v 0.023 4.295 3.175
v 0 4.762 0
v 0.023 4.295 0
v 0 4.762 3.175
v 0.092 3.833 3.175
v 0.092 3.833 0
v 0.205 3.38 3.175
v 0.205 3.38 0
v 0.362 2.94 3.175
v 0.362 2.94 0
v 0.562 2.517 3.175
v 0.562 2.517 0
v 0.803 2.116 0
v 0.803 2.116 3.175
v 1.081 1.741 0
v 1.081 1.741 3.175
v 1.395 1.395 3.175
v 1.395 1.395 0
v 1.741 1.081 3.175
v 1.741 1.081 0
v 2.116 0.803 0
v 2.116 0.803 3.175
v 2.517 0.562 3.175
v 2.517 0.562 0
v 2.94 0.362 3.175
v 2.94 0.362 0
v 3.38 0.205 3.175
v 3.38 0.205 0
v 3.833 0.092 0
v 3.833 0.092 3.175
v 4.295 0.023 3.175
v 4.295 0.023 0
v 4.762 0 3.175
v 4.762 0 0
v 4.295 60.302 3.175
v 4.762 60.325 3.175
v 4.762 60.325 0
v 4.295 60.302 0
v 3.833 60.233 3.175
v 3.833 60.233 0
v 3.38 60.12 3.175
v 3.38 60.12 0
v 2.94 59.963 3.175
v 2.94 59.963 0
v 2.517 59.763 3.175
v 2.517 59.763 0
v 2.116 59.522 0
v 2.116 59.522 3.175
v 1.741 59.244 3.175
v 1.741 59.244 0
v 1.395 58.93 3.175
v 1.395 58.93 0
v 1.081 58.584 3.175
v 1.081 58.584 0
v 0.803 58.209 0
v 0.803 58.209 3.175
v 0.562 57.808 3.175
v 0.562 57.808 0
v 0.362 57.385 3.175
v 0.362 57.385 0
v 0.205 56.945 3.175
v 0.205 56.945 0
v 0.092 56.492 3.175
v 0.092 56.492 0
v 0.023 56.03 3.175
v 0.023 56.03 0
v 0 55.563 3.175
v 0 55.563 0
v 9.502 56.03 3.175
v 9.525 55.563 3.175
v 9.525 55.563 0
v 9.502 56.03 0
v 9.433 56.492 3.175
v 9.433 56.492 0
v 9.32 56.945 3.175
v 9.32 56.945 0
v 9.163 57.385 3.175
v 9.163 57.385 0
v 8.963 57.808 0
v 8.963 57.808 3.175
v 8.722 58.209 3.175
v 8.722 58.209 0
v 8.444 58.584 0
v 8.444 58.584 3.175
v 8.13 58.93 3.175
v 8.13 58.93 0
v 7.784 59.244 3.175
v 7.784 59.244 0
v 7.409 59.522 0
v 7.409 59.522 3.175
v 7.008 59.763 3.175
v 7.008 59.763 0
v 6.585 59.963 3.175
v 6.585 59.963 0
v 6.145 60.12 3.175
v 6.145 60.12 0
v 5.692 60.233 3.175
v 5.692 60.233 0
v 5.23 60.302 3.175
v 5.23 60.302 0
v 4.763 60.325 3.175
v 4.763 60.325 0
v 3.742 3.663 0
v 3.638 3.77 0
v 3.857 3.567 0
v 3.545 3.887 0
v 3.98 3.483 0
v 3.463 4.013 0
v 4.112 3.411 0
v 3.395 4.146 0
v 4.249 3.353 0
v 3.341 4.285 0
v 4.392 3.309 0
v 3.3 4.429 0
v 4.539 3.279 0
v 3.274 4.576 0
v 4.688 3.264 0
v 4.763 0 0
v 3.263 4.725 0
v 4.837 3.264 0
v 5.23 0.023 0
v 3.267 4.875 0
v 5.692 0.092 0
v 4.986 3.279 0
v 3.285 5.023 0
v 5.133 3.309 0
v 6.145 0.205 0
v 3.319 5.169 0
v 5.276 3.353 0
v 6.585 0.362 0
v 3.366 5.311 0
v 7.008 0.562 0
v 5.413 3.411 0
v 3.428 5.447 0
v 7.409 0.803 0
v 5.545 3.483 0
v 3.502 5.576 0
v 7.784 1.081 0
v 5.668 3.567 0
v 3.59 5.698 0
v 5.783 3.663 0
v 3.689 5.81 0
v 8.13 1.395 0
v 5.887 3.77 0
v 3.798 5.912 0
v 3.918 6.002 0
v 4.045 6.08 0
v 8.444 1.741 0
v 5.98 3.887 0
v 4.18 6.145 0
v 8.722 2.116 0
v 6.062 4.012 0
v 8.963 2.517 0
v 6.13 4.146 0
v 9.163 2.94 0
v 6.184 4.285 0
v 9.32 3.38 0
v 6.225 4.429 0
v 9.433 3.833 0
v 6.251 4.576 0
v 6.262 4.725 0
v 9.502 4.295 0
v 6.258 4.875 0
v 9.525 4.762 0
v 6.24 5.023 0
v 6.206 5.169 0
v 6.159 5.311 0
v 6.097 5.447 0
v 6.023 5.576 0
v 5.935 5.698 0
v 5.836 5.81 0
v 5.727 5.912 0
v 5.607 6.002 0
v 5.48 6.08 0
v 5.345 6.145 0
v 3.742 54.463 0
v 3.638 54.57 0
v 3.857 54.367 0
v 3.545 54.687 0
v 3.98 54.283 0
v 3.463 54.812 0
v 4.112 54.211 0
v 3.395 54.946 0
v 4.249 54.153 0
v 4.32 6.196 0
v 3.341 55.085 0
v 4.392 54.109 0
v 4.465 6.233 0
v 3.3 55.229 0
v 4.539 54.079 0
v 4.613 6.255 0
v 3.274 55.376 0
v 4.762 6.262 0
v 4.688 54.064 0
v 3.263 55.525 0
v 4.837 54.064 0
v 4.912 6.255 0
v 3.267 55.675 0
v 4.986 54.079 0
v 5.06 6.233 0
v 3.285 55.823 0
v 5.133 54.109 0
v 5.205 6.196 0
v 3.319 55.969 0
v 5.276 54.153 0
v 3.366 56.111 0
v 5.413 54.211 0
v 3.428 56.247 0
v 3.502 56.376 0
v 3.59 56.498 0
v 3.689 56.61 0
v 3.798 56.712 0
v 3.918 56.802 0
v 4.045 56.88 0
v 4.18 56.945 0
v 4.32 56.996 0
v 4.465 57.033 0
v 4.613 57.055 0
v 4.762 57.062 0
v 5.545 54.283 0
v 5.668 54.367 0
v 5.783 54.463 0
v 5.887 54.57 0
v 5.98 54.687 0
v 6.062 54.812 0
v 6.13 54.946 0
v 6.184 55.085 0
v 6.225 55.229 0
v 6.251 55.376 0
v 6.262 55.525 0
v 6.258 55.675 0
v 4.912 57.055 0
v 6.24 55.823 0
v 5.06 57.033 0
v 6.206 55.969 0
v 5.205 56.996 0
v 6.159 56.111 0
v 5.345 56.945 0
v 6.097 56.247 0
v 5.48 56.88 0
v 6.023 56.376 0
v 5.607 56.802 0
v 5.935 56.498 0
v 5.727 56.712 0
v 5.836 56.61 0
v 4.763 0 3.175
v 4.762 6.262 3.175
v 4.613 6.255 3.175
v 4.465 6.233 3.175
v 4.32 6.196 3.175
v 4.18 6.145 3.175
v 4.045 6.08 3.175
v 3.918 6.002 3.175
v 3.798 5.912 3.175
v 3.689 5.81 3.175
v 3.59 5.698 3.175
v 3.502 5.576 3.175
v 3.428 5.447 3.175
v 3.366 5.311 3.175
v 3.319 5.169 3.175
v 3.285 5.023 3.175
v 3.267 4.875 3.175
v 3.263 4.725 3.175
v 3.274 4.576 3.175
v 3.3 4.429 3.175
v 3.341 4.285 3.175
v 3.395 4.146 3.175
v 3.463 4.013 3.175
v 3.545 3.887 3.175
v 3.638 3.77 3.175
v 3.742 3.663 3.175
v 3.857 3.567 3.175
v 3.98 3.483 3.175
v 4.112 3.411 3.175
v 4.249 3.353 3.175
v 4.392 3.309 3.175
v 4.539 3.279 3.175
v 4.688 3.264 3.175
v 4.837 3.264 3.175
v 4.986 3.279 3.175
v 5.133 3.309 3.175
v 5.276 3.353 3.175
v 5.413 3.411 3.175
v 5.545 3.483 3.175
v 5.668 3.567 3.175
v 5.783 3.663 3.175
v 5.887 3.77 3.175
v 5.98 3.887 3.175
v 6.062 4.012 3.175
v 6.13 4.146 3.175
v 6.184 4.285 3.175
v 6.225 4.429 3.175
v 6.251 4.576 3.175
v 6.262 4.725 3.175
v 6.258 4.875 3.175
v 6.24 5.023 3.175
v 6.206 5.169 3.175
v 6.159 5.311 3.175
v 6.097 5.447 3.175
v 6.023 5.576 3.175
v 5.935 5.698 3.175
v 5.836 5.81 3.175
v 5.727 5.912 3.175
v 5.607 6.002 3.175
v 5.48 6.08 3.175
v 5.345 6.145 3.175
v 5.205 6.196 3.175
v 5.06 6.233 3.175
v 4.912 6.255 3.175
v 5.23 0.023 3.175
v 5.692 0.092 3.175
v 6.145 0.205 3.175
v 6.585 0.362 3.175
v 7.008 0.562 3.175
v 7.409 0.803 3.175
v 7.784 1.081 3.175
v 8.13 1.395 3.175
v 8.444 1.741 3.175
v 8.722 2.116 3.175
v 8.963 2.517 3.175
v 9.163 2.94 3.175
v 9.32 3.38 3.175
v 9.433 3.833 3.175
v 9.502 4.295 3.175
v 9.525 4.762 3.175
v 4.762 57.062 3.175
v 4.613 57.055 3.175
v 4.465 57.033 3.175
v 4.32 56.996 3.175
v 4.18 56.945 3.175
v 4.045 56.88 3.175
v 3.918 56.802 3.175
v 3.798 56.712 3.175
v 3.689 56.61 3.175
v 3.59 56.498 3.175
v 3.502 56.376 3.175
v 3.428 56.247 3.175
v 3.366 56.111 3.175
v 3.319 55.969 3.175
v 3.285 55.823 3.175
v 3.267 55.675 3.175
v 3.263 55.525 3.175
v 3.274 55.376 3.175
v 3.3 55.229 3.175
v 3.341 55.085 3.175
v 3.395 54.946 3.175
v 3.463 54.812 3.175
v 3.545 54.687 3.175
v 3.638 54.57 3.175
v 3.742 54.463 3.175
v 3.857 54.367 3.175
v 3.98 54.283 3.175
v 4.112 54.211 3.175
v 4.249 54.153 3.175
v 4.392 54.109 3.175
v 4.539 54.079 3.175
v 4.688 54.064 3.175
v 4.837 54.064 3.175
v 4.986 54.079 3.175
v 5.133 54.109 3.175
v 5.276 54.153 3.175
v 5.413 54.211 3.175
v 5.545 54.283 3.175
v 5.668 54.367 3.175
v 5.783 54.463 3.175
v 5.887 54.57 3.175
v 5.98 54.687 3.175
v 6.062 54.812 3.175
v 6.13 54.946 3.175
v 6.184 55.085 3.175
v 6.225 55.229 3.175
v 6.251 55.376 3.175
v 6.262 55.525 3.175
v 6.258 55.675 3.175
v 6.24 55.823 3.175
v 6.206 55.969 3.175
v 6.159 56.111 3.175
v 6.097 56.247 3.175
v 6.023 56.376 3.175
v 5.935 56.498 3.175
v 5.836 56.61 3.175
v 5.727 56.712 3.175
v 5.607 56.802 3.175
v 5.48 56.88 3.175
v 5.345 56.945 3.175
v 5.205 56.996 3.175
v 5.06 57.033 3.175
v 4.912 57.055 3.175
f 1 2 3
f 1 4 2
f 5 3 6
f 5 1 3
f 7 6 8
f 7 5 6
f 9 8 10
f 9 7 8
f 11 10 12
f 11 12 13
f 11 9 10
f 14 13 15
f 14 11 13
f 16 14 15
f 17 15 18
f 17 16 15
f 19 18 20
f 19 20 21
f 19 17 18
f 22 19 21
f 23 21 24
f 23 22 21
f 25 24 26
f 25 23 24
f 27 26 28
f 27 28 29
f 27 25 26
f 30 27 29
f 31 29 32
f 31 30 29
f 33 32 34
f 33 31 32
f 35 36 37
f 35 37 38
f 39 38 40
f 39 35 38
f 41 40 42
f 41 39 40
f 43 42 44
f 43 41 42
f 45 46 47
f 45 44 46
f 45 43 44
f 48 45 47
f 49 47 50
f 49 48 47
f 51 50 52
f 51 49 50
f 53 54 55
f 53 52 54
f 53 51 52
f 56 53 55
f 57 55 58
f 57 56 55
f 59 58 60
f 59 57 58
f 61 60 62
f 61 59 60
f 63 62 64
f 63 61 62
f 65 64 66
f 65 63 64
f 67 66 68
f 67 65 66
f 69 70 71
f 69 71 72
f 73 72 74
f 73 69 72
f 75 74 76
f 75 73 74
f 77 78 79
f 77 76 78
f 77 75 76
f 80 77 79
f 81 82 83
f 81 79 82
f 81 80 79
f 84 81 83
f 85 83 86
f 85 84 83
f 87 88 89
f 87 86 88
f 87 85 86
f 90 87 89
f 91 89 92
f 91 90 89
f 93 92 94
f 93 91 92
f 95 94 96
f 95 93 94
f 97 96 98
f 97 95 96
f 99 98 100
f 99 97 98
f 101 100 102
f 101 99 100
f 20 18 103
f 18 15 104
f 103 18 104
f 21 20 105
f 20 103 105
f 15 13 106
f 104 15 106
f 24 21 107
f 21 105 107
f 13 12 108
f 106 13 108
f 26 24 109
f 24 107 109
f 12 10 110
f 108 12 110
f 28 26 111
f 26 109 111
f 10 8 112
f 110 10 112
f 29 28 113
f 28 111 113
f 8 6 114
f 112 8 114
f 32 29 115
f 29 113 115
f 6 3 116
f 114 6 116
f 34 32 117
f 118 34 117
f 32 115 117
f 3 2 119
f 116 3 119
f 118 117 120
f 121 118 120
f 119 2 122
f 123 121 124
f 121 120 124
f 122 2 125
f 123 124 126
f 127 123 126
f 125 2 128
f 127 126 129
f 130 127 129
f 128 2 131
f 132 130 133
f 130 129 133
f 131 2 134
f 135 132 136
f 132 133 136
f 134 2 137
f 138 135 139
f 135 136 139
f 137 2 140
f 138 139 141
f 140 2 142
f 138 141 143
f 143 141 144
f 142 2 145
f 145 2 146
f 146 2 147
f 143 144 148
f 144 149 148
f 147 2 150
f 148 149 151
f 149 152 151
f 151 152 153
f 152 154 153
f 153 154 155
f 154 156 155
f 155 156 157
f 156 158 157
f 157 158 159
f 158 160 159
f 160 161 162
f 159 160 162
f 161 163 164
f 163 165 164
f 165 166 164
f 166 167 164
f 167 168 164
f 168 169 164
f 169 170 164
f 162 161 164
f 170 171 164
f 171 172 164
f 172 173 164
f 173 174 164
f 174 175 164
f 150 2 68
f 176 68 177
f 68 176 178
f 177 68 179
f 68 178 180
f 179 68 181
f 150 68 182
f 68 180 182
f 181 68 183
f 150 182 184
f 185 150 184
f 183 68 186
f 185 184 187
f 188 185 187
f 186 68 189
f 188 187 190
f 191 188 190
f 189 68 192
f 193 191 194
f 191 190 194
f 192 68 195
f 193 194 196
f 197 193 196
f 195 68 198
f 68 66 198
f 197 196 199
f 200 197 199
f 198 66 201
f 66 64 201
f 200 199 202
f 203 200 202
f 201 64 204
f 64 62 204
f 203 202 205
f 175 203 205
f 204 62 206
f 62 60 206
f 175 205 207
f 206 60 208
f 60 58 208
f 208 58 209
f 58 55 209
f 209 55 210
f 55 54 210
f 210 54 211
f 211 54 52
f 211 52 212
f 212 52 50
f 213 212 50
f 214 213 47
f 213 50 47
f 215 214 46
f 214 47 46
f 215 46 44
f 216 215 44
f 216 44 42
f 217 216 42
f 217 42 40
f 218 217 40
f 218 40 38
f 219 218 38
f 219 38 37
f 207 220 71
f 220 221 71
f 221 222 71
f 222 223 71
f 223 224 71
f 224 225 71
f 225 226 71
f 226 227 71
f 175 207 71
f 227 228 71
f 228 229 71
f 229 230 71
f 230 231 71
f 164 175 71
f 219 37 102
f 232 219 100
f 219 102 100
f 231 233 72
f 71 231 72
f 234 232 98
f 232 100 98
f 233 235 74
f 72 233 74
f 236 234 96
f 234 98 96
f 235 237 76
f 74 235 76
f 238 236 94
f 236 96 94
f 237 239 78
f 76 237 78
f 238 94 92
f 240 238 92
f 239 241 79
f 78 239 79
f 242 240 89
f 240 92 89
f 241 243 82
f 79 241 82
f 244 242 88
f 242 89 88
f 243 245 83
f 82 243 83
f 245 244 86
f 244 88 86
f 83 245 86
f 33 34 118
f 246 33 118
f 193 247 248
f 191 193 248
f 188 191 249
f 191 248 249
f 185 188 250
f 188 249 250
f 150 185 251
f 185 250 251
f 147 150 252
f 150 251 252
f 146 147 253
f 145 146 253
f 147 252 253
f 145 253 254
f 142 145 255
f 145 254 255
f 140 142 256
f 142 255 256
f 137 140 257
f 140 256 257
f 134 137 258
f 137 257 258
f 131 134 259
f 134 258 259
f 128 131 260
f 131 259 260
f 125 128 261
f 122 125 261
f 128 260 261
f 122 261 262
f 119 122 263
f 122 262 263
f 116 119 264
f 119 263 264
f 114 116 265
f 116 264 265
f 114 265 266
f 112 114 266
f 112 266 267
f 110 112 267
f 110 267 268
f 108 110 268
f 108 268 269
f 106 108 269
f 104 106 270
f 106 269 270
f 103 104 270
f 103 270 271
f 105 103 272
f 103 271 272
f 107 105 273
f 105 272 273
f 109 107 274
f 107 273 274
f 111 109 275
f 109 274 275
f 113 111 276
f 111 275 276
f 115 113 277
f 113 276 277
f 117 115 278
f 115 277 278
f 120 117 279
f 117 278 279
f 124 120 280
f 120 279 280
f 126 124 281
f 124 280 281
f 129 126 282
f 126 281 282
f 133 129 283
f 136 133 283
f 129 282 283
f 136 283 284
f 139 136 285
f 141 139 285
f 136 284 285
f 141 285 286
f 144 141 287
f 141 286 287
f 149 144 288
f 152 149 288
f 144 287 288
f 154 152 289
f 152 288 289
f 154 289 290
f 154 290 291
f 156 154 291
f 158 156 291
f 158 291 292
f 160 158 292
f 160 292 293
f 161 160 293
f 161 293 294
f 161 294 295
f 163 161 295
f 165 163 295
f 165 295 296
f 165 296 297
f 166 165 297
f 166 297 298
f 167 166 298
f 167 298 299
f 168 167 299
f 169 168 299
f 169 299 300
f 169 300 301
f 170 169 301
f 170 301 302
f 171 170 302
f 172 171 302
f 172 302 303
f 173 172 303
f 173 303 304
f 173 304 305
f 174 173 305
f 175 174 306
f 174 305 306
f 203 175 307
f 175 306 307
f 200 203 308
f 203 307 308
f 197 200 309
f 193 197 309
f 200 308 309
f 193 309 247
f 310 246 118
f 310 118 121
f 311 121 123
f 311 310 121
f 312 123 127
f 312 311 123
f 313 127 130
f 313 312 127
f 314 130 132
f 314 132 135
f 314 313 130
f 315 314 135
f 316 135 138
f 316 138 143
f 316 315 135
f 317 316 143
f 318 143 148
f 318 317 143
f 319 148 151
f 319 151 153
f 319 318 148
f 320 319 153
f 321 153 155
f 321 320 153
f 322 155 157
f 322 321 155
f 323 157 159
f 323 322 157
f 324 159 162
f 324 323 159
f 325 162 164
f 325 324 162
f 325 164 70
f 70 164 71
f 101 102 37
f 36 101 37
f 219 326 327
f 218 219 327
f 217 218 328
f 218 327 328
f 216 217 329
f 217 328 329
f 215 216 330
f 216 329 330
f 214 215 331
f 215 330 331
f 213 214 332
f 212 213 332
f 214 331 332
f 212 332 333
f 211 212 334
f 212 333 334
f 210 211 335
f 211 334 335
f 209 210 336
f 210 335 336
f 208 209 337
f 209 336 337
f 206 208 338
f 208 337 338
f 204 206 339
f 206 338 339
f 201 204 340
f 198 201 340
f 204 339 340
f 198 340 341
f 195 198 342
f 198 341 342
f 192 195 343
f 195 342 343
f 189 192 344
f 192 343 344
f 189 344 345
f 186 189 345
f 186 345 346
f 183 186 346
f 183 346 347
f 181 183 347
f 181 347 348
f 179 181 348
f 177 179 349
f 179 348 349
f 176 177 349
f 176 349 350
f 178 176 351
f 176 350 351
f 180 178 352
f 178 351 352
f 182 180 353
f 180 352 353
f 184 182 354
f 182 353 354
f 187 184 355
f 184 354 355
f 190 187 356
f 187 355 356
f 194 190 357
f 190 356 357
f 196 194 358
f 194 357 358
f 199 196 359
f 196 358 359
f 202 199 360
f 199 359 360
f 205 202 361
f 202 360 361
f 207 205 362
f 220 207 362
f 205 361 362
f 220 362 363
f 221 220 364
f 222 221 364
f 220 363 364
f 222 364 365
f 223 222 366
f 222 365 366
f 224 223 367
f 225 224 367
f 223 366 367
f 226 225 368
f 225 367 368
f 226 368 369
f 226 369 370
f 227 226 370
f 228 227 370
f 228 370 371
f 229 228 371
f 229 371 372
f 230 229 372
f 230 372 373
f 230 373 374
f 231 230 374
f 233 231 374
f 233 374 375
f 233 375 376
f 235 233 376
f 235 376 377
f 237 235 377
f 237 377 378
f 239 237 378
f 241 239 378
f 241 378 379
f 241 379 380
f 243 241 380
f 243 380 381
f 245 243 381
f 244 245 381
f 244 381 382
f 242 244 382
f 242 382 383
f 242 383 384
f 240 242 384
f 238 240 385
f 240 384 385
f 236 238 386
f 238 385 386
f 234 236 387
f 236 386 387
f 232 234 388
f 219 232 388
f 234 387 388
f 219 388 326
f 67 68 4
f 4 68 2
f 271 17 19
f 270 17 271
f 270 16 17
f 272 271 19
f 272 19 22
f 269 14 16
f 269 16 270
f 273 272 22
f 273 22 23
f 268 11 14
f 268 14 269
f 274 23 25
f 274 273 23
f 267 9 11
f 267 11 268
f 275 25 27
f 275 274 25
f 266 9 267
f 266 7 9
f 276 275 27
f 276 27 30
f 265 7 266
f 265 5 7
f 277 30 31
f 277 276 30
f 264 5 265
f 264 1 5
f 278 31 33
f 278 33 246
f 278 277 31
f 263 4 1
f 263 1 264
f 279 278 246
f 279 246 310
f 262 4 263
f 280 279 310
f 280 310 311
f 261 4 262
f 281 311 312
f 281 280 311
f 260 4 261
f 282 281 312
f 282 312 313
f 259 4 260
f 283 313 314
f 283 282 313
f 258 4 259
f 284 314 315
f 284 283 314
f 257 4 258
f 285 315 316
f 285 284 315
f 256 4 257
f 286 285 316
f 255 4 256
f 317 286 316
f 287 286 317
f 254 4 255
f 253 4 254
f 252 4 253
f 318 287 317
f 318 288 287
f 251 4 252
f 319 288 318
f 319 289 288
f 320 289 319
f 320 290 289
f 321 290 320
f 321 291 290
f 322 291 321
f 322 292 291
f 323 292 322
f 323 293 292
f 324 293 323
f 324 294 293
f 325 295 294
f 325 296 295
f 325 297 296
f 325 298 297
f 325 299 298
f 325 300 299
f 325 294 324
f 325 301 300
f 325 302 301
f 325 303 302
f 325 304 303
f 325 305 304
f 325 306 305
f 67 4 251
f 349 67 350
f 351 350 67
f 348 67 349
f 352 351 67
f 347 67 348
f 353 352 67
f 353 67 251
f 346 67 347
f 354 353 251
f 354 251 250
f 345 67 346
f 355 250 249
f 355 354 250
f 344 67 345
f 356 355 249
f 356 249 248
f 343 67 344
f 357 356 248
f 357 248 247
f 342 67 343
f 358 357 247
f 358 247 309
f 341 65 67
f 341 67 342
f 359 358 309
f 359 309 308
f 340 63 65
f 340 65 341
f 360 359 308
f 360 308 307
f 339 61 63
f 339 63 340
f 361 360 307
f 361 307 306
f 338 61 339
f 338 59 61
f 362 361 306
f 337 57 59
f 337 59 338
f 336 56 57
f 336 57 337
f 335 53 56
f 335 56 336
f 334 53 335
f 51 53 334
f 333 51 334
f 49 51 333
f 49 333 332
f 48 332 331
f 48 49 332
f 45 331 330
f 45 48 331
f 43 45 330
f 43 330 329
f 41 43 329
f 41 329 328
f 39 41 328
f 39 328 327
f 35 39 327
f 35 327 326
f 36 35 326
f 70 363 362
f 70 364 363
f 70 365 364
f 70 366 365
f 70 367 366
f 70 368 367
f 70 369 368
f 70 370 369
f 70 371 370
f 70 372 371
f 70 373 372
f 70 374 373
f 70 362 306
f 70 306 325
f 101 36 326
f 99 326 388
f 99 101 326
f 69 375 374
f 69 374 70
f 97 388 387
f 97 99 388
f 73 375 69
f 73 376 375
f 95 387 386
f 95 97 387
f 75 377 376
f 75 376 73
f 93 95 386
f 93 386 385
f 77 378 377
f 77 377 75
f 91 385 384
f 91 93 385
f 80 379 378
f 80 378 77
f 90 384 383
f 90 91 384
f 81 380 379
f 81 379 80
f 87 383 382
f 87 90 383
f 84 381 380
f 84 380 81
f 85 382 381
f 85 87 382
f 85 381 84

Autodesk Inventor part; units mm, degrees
ref_plane "YZ Plane" through (0, 0, 0) normal (1, 0, 0) x (0, 1, 0)
ref_plane "XZ Plane" through (0, 0, 0) normal (0, 1, 0) x (-1, 0, 0)
ref_plane "XY Plane" through (0, 0, 0) normal (0, 0, 1) x (1, 0, 0)
sketch "Sketch1" plane through (0, 0, 0) normal (0, 0, 1) x (1, 0, 0)
  line L0 (0, 0) -> (9.525, 0)
  line L1 (9.525, 0) -> (9.525, 60.325)
  line L2 (9.525, 60.325) -> (0, 60.325)
  line L3 (0, 60.325) -> (0, 0)
  circle A0 centre (4.7625, 55.5625) radius 4.7625
  circle A1 centre (4.7625, 4.7625) radius 4.7625
  point P0 (4.7625, 0)
  dimension "d0" = 50.8
  dimension "d3" = 9.525
extrude "Extrusion1" add sketch "Sketch1" along normal blind 3.175
hole "Hole1" at (4.7625, 4.7625, 0) at (4.7625, 55.5625, 0) direction (0, 0, 1) diameter 3 end through all
fillet "Fillet1" radius 4.7625 4 edges at (9.525, 0, 1.5875) (0, 0, 1.5875) (0, 60.325, 1.5875) (9.525, 60.325, 1.5875)
sketch "Sketch2" plane through (0, 0, 3.175) normal (0, 0, 1) x (1, 0, 0)
  circle A0 centre (4.7625, 4.7625) radius 1.5 projected
  circle A1 centre (4.7625, 55.5625) radius 1.5 projected
  arc A2 (9.525, 55.5625) -> (0, 55.5625) centre (4.7625, 55.5625) ccw projected
  line L0 (0, 55.5625) -> (0, 4.7625) projected
  arc A3 (0, 4.7625) -> (9.525, 4.7625) centre (4.7625, 4.7625) ccw projected
  line L1 (9.525, 4.7625) -> (9.525, 55.5625) projected
  point P0 (0, 0)
equation "\"d13\" = 0.5 * d3"
properties part number "Linkage"
